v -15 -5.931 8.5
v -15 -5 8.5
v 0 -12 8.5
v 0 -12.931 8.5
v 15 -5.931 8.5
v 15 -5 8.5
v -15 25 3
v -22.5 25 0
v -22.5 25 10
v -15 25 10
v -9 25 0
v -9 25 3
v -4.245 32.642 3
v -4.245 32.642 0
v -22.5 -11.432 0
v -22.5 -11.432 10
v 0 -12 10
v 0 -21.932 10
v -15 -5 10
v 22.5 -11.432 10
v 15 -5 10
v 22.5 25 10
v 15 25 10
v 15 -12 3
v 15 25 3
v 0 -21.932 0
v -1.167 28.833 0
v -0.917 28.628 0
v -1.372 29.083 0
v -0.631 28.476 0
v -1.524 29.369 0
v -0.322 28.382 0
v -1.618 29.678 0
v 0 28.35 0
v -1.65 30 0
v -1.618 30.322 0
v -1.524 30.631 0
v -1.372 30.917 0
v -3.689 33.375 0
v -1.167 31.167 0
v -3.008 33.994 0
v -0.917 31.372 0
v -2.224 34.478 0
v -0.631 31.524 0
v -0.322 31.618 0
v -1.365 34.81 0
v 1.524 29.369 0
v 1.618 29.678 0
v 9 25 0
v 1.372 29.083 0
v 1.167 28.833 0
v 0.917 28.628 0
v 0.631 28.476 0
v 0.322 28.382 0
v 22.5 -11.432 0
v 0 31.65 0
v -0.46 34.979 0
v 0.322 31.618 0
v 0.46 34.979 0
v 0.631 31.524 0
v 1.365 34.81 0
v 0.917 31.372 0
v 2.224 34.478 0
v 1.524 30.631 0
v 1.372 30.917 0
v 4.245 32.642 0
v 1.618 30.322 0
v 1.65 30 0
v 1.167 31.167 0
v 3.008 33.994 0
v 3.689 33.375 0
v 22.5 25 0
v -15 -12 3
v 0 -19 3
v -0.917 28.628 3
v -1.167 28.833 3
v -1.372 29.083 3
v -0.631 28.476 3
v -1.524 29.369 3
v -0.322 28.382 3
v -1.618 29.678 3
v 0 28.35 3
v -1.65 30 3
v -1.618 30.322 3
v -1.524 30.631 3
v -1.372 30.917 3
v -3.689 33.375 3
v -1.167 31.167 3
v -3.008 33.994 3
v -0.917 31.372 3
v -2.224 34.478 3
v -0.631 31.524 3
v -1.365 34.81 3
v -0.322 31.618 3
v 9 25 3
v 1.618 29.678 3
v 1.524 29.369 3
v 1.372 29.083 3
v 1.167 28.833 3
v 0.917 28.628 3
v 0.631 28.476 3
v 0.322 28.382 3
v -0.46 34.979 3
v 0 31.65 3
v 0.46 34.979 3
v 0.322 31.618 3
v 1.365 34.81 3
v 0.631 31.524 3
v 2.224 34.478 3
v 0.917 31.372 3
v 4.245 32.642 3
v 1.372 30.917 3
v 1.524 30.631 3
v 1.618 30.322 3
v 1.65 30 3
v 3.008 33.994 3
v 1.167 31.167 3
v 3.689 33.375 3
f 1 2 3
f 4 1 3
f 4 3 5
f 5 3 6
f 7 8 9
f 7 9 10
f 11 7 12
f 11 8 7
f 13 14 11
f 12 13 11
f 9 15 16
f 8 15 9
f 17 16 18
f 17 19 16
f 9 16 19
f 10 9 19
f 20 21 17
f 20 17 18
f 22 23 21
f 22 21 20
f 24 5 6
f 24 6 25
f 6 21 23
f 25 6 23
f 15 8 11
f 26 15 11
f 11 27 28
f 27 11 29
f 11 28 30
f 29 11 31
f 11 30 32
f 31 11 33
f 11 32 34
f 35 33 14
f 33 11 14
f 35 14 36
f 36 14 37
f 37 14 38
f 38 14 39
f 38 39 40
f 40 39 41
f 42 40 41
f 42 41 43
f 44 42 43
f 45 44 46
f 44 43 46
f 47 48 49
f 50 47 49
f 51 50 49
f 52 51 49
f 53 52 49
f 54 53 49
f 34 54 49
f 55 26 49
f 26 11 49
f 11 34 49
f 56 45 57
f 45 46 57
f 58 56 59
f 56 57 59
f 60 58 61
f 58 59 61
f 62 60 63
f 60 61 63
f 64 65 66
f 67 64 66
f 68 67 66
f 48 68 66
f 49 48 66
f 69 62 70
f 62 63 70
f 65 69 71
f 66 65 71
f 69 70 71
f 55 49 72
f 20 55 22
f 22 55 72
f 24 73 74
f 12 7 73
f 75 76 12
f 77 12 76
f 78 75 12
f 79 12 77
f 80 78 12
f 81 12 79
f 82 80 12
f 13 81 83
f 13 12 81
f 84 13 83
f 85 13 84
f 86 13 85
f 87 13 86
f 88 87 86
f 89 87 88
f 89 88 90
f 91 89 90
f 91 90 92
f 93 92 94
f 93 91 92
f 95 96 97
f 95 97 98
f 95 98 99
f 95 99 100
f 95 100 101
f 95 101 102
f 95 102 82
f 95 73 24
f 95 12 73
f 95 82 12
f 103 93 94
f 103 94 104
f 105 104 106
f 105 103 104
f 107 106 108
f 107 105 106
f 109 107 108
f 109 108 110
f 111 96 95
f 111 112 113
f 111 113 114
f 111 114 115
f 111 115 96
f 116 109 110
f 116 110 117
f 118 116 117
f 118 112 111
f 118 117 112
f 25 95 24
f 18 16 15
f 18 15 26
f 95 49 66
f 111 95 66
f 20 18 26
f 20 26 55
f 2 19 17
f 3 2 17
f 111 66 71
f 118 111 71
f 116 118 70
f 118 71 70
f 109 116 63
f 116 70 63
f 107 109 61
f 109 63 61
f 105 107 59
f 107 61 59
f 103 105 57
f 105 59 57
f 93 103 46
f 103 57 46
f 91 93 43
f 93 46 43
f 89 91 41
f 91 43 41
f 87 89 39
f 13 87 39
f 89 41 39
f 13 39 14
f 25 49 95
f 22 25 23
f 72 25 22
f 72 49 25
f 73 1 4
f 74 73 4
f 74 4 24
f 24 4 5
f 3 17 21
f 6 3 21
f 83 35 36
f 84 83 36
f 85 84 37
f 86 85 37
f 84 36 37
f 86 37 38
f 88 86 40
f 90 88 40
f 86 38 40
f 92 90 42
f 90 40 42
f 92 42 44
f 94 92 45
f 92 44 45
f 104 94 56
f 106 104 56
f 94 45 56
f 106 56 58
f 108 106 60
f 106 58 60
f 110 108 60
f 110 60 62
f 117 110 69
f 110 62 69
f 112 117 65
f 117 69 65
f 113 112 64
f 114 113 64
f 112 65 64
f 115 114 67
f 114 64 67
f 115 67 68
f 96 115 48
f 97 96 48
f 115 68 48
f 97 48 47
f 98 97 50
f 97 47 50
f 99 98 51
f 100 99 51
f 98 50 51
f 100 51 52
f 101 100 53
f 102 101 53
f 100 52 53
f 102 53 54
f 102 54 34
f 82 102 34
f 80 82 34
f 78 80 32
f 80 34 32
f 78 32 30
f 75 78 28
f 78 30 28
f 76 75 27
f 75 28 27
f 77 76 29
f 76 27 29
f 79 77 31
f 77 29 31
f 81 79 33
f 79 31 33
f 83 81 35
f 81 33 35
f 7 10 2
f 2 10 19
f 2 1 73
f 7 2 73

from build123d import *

# Parameters (mm, degrees)
ESBO_O1_W                = 45
ESBO_O1_H                = 50
RESSALTO_EXTRUS_O1_DEPTH = 10
CORTE_EXTRUS_O1_DEPTH    = 7
CORTE_EXTRUS_O2_DEPTH    = 5.5
CHANFRO1_SIZE            = 5.5
ESBO_O4_R                = 1.65
RESSALTO_EXTRUS_O2_DEPTH = 3
CORTE_EXTRUS_O3_DEPTH    = 43.793106922


with BuildPart() as part:
    # Esboço1 → Ressalto-extrusão1 (new body)
    with BuildSketch(Plane.XY):
        Rectangle(ESBO_O1_W, ESBO_O1_H)
    extrude(amount=RESSALTO_EXTRUS_O1_DEPTH)

    # Esboço2 → Corte-extrusão1 (cut)
    with BuildSketch(Plane.XY.offset(10)):
        Polygon((-15, -5), (0, -12), (15, -5), (15, 25), (-15, 25), align=None)
    extrude(amount=-CORTE_EXTRUS_O1_DEPTH, mode=Mode.SUBTRACT)

    # Esboço3 → Corte-extrusão2 (cut)
    with BuildSketch(Plane.XY.offset(3)):
        Polygon((-15, -5), (-15, -12), (0, -19), (15, -12), (15, -5), align=None)
    extrude(amount=CORTE_EXTRUS_O2_DEPTH, mode=Mode.SUBTRACT)

    # Chanfro1
    chanfro1_edges = [part.edges().sort_by_distance(p)[0] for p in [
        (-7.5, -15.5, 8.5),
        (7.5, -15.5, 8.5),
    ]]
    chamfer(chanfro1_edges, length=CHANFRO1_SIZE - 0.0001)  # a hair under: the kernel refuses the full size

    # Esboço4 → Ressalto-extrusão2 (add)
    with BuildSketch(Plane(origin=(0, 0, 0), x_dir=(-1, 0, 0), z_dir=(0, 0, -1))):
        with BuildLine():
            Line((4.245283019, 32.641509434), (9, 25))
            Line((9, 25), (-9, 25))
            Line((-9, 25), (-4.245283019, 32.641509434))
            ThreePointArc((-4.245283019, 32.641509434), (0, 35), (4.245283019, 32.641509434))
        make_face()
        with Locations((0, 30)):
            Circle(ESBO_O4_R, mode=Mode.SUBTRACT)
    extrude(amount=-RESSALTO_EXTRUS_O2_DEPTH)

    # Esboço5 → Corte-extrusão3 (cut, through all)
    with BuildSketch(Plane.XY.offset(10)):
        Polygon((-22.5, -11.431767214), (0, -21.931767214), (22.5, -11.431767214), (22.5, -32.501990612), (-22.5, -32.501990612), align=None)
    extrude(amount=-CORTE_EXTRUS_O3_DEPTH, mode=Mode.SUBTRACT)


solid = part.part
